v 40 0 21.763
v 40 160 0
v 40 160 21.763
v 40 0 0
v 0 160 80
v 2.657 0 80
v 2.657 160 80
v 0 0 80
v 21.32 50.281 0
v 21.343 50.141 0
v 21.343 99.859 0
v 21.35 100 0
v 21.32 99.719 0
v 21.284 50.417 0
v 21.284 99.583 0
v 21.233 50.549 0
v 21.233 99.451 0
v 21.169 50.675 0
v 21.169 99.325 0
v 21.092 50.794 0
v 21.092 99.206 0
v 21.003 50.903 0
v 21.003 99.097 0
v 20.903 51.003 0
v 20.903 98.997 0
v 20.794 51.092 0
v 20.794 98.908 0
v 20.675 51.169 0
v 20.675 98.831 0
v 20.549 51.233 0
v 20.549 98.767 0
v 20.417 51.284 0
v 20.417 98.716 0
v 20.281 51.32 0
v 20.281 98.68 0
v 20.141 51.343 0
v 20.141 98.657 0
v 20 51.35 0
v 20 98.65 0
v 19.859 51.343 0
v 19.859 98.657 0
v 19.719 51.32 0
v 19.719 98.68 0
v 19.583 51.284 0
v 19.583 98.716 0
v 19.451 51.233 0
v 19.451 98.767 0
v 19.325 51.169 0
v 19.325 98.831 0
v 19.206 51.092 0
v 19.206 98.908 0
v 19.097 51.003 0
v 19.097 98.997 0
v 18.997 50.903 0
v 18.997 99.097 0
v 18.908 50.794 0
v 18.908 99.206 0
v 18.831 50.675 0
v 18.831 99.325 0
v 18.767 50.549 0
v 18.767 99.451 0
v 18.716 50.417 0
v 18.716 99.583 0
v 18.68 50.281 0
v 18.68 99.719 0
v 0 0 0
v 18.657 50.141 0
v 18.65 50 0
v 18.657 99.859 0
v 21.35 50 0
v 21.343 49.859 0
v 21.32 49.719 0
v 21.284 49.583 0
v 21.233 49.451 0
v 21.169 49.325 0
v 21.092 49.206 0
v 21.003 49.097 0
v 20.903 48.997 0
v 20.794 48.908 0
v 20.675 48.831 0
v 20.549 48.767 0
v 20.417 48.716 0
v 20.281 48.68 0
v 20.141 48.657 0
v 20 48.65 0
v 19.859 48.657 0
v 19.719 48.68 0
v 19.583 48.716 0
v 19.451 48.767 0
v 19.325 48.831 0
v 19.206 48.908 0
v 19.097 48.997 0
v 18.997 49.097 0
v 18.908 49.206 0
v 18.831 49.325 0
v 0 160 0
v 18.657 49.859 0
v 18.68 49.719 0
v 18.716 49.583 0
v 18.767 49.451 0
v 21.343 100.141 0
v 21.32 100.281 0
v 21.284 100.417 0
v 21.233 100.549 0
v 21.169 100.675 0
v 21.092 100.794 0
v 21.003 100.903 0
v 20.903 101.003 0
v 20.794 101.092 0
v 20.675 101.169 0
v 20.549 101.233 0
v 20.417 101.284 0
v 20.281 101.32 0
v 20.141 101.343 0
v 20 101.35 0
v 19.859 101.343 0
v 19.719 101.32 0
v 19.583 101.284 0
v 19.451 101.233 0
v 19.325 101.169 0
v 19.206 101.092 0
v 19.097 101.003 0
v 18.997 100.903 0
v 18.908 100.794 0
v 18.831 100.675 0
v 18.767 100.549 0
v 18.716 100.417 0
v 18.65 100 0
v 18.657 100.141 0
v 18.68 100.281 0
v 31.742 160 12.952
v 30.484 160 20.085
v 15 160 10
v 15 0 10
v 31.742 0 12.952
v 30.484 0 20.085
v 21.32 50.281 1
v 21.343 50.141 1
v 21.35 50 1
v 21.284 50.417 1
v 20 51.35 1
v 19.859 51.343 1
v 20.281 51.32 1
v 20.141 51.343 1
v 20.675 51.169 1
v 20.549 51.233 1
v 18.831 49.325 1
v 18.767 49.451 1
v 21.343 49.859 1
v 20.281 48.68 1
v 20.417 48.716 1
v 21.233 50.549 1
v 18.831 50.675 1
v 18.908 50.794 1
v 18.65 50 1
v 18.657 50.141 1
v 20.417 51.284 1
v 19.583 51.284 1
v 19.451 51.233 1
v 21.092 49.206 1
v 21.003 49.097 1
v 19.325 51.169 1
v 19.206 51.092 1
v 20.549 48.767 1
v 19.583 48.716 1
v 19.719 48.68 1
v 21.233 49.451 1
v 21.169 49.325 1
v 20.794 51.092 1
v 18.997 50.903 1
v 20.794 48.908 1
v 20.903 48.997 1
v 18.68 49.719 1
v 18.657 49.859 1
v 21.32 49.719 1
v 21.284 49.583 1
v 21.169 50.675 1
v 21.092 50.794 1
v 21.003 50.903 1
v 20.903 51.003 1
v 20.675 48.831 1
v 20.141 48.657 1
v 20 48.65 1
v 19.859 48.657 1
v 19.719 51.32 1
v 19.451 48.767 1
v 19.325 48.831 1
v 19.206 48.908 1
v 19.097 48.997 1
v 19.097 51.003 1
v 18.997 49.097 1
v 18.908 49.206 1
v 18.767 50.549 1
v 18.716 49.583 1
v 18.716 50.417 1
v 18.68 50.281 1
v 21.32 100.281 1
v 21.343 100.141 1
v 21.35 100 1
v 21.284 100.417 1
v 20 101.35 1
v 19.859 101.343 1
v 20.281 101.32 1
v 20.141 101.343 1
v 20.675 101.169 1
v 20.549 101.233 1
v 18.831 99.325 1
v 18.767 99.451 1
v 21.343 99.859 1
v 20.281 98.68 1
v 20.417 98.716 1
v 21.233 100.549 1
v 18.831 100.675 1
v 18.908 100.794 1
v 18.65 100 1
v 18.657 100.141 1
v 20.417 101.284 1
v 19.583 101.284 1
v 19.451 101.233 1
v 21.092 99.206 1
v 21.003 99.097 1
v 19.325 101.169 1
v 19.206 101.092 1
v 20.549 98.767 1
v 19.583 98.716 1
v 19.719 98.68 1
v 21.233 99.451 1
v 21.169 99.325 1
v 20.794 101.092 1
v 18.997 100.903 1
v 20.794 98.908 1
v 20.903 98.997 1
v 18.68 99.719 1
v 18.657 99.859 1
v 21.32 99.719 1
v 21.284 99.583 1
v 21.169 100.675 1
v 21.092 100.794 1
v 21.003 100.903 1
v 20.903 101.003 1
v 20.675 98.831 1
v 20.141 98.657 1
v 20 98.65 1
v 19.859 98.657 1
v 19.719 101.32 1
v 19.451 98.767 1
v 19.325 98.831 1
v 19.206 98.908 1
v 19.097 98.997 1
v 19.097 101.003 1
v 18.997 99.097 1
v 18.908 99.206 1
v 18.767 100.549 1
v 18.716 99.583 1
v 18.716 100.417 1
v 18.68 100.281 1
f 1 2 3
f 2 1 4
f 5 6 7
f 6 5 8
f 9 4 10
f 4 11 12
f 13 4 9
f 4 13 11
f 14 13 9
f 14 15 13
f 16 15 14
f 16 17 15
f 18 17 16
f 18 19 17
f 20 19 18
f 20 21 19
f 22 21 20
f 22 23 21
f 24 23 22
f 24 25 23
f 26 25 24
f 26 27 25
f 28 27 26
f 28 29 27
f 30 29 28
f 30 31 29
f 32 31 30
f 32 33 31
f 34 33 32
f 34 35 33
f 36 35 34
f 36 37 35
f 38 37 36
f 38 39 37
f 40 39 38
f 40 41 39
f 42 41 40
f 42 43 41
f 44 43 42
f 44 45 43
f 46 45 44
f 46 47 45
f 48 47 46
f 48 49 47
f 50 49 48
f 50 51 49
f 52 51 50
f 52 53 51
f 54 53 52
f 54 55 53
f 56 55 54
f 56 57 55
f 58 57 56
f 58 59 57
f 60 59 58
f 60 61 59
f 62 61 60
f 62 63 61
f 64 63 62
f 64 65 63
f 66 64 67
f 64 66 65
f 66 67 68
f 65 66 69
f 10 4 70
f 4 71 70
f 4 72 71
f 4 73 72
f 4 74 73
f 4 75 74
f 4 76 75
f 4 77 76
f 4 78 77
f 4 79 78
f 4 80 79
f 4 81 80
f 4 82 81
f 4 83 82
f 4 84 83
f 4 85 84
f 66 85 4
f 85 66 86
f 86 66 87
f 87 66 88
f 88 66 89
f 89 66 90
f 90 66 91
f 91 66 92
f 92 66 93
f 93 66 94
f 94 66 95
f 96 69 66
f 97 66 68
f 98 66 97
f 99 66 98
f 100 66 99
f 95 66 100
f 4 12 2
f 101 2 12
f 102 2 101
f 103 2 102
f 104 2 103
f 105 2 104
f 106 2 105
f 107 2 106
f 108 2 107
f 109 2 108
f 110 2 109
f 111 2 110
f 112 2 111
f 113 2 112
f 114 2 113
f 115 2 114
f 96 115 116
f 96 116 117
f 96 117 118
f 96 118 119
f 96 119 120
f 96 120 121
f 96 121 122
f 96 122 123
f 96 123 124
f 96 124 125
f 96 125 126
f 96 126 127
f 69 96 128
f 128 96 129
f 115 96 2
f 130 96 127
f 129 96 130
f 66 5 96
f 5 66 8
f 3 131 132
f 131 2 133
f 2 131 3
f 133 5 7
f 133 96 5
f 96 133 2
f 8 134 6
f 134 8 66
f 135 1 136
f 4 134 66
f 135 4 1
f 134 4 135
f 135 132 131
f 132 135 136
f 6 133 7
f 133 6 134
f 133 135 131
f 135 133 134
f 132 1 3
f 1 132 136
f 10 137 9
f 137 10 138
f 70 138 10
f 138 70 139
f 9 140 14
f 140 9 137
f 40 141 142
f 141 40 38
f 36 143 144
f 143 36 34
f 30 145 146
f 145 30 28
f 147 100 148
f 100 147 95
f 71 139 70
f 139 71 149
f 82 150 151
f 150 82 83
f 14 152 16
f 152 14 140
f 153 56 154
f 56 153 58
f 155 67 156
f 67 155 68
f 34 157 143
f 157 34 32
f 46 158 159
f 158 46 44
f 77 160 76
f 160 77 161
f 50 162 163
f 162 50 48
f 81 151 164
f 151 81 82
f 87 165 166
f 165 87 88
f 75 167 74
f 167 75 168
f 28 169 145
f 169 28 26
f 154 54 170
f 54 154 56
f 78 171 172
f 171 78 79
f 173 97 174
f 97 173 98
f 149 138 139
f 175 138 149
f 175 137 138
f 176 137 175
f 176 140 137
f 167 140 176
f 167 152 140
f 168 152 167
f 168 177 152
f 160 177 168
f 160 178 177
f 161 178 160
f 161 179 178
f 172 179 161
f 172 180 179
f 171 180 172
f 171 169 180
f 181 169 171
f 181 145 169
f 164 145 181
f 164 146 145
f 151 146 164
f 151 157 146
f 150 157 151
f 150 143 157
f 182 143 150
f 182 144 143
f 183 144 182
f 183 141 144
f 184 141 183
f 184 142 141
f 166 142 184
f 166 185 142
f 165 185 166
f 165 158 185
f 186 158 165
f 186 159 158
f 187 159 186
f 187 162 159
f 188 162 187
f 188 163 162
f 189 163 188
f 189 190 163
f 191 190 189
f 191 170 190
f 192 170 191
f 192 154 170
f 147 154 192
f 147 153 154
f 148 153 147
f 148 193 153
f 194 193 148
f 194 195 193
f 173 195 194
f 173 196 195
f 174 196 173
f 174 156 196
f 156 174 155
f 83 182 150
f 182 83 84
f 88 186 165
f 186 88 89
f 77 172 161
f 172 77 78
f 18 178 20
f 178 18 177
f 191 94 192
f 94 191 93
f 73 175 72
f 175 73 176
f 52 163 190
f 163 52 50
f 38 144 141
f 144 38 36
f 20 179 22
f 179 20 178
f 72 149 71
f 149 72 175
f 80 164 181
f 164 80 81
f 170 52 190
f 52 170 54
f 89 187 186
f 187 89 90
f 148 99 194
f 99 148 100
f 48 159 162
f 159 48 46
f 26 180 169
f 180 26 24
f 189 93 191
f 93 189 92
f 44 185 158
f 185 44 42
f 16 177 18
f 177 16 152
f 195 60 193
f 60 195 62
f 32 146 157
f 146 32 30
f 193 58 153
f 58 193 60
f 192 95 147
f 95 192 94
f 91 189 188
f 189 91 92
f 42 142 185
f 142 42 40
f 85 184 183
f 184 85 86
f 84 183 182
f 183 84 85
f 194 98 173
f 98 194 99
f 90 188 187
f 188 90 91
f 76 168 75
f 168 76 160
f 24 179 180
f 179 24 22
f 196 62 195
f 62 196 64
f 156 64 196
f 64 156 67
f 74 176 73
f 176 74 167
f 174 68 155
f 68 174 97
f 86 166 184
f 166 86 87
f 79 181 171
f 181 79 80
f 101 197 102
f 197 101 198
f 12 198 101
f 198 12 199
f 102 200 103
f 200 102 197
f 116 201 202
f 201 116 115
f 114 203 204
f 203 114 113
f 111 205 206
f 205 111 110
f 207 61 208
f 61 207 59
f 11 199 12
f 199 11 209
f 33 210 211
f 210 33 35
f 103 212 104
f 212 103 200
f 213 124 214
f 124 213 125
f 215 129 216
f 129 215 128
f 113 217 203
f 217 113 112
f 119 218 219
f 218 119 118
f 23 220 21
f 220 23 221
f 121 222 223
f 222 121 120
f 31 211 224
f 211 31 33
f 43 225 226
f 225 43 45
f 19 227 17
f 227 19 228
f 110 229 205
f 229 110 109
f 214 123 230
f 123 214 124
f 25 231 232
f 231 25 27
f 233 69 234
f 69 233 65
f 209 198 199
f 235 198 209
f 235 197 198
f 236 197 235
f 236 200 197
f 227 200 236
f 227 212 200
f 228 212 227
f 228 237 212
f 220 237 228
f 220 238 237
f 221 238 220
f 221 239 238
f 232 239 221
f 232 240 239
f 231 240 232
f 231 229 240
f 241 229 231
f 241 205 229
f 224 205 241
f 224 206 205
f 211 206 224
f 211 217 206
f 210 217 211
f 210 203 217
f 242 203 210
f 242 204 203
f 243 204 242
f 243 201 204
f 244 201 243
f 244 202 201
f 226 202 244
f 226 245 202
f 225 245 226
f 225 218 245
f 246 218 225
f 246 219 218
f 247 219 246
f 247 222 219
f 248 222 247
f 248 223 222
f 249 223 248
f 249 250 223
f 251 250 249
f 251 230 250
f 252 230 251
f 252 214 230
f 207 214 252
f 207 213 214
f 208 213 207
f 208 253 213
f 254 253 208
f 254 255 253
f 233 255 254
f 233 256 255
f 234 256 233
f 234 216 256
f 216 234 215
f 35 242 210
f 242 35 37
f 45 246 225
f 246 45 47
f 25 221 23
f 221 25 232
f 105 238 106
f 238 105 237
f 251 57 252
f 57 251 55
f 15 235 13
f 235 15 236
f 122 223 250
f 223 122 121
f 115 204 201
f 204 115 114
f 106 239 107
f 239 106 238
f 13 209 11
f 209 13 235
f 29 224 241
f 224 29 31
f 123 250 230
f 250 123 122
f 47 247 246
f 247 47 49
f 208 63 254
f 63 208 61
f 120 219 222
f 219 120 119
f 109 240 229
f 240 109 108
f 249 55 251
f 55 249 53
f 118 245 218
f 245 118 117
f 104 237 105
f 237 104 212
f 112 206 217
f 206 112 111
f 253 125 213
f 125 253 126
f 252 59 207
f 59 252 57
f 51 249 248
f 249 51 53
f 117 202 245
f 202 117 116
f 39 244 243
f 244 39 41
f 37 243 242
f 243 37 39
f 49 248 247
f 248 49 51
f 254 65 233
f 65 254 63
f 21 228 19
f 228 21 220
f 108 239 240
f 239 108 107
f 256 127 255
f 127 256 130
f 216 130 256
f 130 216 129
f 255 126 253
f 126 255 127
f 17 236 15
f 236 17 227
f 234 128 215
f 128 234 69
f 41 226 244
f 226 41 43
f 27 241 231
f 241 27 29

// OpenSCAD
// mac mini monitorstand
// Sebastian Weigl
// 11.11.2025
// v02 --with insets

difference(){
cube([40,160,80]);
translate([15,0,10])
rotate([0,-10,0])
cube([17,160,225]);
translate([30,0,20])
rotate([0,-10,0])
cube([22,160,225]);

//  holls for insets
$fn=60;
  translate([20,50,0])
  #cylinder(d=2.7,h=6,true);
  translate([20,100,0])
  #cylinder(d=2.7,h=6,true);
}
